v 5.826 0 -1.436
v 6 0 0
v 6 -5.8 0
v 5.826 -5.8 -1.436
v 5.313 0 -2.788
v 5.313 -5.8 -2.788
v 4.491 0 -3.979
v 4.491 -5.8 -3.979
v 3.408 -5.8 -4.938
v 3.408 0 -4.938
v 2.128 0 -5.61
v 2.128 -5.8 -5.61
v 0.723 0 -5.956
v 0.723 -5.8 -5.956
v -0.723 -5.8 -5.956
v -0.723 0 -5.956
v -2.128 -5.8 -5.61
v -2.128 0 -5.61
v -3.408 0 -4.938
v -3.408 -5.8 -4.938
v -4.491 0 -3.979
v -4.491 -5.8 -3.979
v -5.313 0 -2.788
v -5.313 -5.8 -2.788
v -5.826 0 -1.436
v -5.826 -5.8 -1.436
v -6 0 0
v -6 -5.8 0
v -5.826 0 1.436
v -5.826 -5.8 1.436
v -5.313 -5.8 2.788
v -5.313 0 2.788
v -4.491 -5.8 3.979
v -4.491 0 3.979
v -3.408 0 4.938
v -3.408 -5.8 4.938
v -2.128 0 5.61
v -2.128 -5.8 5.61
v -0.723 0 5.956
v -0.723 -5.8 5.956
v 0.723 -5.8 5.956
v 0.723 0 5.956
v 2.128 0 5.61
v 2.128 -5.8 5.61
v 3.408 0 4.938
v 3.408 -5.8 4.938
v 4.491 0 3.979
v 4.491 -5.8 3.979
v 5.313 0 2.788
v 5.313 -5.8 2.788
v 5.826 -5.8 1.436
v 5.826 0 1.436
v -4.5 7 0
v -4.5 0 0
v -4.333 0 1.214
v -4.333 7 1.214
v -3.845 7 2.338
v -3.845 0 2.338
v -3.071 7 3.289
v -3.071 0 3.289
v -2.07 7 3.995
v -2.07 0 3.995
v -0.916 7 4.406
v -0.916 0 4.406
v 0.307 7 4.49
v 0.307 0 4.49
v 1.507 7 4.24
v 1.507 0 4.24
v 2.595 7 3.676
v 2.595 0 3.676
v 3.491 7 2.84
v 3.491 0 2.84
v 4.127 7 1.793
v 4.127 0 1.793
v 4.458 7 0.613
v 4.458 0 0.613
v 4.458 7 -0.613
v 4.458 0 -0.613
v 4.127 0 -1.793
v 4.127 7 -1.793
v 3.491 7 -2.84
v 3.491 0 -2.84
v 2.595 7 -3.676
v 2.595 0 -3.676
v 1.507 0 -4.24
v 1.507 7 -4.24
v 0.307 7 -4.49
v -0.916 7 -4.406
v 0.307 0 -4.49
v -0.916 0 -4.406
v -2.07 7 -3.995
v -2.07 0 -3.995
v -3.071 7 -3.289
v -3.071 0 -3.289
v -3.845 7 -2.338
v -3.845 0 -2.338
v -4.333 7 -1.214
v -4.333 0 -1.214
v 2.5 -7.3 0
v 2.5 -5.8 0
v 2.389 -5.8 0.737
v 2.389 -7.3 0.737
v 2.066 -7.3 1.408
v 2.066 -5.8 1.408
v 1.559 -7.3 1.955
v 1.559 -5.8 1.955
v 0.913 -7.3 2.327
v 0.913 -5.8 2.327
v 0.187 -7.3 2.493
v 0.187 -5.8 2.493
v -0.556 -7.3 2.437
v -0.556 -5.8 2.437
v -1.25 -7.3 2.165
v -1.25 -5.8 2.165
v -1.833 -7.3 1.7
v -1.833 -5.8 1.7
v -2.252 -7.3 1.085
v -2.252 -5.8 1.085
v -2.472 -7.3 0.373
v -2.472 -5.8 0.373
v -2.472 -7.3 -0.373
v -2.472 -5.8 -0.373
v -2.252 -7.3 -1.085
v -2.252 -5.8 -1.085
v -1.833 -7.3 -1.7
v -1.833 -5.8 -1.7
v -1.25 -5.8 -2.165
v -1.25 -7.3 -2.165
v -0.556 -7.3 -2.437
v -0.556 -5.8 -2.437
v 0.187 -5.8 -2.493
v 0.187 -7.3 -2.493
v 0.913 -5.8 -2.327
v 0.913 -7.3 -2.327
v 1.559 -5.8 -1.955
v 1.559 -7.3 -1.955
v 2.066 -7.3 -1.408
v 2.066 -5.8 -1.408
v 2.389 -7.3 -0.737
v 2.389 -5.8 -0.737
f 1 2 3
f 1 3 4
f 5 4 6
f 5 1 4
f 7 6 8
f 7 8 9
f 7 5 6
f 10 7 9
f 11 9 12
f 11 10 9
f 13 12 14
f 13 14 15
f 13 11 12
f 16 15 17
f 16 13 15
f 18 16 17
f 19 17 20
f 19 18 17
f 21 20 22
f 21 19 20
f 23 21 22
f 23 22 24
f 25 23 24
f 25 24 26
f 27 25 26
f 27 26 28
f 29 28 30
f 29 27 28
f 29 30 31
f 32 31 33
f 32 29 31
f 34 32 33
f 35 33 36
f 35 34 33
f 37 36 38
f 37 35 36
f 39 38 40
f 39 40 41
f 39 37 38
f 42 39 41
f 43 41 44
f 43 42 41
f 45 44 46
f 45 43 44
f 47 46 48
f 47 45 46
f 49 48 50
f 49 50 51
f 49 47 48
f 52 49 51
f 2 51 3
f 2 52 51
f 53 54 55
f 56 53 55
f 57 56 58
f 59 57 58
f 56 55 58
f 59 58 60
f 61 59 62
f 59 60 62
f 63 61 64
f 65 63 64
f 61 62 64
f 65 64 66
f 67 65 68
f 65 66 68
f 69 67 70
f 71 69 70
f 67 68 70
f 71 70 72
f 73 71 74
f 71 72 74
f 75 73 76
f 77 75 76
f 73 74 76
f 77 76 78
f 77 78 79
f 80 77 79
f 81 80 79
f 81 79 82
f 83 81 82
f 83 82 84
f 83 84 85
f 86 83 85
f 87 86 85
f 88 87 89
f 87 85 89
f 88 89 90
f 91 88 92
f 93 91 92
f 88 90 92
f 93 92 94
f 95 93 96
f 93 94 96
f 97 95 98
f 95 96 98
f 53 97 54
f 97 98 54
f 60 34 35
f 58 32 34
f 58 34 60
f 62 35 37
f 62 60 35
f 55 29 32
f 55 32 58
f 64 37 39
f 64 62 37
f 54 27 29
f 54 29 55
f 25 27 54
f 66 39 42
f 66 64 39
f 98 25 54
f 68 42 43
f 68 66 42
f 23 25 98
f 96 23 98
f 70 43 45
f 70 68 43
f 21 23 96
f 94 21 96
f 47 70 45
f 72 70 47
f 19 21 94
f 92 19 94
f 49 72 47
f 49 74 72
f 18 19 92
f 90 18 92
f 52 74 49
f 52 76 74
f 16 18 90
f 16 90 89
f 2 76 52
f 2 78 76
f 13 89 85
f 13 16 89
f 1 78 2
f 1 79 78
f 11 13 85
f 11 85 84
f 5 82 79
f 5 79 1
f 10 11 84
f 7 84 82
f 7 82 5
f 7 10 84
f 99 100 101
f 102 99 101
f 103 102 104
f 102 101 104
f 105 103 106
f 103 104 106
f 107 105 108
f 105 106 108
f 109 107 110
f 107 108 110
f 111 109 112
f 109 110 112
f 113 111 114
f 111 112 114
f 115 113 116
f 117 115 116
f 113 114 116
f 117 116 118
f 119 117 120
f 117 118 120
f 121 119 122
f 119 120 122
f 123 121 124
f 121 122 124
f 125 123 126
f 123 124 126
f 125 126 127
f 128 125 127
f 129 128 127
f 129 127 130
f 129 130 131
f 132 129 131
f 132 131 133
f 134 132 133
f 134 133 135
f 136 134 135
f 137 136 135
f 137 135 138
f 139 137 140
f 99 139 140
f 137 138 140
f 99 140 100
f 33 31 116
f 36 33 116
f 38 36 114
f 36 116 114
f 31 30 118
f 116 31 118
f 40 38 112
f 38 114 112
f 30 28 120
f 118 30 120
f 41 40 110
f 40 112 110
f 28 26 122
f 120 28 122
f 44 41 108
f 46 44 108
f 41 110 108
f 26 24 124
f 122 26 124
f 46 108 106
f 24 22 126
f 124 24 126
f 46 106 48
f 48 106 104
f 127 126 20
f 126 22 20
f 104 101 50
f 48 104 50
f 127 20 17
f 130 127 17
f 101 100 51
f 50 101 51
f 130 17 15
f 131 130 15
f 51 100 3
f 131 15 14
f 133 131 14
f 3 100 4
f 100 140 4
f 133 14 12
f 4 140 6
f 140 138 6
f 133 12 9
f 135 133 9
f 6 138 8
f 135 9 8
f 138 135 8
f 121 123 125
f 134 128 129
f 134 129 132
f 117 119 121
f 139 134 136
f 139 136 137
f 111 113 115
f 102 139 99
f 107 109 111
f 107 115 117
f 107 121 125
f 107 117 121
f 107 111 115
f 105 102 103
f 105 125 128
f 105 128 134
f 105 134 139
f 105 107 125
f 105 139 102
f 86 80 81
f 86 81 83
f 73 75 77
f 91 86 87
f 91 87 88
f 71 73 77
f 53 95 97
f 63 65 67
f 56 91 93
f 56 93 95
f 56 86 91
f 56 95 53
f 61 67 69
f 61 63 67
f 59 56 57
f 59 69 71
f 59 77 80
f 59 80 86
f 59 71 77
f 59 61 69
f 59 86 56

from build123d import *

# Parameters (mm, degrees)
SKETCH1_R           = 6
BOSS_EXTRUDE2_DEPTH = 5.8
SKETCH5_R           = 4.5
BOSS_EXTRUDE3_DEPTH = 7
SKETCH6_R           = 2.5
BOSS_EXTRUDE4_DEPTH = 1.5


with BuildPart() as part:
    # Sketch1 → Boss-Extrude2 (new body)
    with BuildSketch(Plane(origin=(0, 0, 0), x_dir=(1, 0, 0), z_dir=(0, 1, 0))):
        Circle(SKETCH1_R)
    extrude(amount=-BOSS_EXTRUDE2_DEPTH)

    # Sketch5 → Boss-Extrude3 (add)
    with BuildSketch(Plane(origin=(0, 0, 0), x_dir=(-1, 0, 0), z_dir=(0, 1, 0))):
        Circle(SKETCH5_R)
    extrude(amount=BOSS_EXTRUDE3_DEPTH)

    # Sketch6 → Boss-Extrude4 (add)
    with BuildSketch(Plane.XZ.offset(5.8)):
        Circle(SKETCH6_R)
    extrude(amount=BOSS_EXTRUDE4_DEPTH)


solid = part.part
